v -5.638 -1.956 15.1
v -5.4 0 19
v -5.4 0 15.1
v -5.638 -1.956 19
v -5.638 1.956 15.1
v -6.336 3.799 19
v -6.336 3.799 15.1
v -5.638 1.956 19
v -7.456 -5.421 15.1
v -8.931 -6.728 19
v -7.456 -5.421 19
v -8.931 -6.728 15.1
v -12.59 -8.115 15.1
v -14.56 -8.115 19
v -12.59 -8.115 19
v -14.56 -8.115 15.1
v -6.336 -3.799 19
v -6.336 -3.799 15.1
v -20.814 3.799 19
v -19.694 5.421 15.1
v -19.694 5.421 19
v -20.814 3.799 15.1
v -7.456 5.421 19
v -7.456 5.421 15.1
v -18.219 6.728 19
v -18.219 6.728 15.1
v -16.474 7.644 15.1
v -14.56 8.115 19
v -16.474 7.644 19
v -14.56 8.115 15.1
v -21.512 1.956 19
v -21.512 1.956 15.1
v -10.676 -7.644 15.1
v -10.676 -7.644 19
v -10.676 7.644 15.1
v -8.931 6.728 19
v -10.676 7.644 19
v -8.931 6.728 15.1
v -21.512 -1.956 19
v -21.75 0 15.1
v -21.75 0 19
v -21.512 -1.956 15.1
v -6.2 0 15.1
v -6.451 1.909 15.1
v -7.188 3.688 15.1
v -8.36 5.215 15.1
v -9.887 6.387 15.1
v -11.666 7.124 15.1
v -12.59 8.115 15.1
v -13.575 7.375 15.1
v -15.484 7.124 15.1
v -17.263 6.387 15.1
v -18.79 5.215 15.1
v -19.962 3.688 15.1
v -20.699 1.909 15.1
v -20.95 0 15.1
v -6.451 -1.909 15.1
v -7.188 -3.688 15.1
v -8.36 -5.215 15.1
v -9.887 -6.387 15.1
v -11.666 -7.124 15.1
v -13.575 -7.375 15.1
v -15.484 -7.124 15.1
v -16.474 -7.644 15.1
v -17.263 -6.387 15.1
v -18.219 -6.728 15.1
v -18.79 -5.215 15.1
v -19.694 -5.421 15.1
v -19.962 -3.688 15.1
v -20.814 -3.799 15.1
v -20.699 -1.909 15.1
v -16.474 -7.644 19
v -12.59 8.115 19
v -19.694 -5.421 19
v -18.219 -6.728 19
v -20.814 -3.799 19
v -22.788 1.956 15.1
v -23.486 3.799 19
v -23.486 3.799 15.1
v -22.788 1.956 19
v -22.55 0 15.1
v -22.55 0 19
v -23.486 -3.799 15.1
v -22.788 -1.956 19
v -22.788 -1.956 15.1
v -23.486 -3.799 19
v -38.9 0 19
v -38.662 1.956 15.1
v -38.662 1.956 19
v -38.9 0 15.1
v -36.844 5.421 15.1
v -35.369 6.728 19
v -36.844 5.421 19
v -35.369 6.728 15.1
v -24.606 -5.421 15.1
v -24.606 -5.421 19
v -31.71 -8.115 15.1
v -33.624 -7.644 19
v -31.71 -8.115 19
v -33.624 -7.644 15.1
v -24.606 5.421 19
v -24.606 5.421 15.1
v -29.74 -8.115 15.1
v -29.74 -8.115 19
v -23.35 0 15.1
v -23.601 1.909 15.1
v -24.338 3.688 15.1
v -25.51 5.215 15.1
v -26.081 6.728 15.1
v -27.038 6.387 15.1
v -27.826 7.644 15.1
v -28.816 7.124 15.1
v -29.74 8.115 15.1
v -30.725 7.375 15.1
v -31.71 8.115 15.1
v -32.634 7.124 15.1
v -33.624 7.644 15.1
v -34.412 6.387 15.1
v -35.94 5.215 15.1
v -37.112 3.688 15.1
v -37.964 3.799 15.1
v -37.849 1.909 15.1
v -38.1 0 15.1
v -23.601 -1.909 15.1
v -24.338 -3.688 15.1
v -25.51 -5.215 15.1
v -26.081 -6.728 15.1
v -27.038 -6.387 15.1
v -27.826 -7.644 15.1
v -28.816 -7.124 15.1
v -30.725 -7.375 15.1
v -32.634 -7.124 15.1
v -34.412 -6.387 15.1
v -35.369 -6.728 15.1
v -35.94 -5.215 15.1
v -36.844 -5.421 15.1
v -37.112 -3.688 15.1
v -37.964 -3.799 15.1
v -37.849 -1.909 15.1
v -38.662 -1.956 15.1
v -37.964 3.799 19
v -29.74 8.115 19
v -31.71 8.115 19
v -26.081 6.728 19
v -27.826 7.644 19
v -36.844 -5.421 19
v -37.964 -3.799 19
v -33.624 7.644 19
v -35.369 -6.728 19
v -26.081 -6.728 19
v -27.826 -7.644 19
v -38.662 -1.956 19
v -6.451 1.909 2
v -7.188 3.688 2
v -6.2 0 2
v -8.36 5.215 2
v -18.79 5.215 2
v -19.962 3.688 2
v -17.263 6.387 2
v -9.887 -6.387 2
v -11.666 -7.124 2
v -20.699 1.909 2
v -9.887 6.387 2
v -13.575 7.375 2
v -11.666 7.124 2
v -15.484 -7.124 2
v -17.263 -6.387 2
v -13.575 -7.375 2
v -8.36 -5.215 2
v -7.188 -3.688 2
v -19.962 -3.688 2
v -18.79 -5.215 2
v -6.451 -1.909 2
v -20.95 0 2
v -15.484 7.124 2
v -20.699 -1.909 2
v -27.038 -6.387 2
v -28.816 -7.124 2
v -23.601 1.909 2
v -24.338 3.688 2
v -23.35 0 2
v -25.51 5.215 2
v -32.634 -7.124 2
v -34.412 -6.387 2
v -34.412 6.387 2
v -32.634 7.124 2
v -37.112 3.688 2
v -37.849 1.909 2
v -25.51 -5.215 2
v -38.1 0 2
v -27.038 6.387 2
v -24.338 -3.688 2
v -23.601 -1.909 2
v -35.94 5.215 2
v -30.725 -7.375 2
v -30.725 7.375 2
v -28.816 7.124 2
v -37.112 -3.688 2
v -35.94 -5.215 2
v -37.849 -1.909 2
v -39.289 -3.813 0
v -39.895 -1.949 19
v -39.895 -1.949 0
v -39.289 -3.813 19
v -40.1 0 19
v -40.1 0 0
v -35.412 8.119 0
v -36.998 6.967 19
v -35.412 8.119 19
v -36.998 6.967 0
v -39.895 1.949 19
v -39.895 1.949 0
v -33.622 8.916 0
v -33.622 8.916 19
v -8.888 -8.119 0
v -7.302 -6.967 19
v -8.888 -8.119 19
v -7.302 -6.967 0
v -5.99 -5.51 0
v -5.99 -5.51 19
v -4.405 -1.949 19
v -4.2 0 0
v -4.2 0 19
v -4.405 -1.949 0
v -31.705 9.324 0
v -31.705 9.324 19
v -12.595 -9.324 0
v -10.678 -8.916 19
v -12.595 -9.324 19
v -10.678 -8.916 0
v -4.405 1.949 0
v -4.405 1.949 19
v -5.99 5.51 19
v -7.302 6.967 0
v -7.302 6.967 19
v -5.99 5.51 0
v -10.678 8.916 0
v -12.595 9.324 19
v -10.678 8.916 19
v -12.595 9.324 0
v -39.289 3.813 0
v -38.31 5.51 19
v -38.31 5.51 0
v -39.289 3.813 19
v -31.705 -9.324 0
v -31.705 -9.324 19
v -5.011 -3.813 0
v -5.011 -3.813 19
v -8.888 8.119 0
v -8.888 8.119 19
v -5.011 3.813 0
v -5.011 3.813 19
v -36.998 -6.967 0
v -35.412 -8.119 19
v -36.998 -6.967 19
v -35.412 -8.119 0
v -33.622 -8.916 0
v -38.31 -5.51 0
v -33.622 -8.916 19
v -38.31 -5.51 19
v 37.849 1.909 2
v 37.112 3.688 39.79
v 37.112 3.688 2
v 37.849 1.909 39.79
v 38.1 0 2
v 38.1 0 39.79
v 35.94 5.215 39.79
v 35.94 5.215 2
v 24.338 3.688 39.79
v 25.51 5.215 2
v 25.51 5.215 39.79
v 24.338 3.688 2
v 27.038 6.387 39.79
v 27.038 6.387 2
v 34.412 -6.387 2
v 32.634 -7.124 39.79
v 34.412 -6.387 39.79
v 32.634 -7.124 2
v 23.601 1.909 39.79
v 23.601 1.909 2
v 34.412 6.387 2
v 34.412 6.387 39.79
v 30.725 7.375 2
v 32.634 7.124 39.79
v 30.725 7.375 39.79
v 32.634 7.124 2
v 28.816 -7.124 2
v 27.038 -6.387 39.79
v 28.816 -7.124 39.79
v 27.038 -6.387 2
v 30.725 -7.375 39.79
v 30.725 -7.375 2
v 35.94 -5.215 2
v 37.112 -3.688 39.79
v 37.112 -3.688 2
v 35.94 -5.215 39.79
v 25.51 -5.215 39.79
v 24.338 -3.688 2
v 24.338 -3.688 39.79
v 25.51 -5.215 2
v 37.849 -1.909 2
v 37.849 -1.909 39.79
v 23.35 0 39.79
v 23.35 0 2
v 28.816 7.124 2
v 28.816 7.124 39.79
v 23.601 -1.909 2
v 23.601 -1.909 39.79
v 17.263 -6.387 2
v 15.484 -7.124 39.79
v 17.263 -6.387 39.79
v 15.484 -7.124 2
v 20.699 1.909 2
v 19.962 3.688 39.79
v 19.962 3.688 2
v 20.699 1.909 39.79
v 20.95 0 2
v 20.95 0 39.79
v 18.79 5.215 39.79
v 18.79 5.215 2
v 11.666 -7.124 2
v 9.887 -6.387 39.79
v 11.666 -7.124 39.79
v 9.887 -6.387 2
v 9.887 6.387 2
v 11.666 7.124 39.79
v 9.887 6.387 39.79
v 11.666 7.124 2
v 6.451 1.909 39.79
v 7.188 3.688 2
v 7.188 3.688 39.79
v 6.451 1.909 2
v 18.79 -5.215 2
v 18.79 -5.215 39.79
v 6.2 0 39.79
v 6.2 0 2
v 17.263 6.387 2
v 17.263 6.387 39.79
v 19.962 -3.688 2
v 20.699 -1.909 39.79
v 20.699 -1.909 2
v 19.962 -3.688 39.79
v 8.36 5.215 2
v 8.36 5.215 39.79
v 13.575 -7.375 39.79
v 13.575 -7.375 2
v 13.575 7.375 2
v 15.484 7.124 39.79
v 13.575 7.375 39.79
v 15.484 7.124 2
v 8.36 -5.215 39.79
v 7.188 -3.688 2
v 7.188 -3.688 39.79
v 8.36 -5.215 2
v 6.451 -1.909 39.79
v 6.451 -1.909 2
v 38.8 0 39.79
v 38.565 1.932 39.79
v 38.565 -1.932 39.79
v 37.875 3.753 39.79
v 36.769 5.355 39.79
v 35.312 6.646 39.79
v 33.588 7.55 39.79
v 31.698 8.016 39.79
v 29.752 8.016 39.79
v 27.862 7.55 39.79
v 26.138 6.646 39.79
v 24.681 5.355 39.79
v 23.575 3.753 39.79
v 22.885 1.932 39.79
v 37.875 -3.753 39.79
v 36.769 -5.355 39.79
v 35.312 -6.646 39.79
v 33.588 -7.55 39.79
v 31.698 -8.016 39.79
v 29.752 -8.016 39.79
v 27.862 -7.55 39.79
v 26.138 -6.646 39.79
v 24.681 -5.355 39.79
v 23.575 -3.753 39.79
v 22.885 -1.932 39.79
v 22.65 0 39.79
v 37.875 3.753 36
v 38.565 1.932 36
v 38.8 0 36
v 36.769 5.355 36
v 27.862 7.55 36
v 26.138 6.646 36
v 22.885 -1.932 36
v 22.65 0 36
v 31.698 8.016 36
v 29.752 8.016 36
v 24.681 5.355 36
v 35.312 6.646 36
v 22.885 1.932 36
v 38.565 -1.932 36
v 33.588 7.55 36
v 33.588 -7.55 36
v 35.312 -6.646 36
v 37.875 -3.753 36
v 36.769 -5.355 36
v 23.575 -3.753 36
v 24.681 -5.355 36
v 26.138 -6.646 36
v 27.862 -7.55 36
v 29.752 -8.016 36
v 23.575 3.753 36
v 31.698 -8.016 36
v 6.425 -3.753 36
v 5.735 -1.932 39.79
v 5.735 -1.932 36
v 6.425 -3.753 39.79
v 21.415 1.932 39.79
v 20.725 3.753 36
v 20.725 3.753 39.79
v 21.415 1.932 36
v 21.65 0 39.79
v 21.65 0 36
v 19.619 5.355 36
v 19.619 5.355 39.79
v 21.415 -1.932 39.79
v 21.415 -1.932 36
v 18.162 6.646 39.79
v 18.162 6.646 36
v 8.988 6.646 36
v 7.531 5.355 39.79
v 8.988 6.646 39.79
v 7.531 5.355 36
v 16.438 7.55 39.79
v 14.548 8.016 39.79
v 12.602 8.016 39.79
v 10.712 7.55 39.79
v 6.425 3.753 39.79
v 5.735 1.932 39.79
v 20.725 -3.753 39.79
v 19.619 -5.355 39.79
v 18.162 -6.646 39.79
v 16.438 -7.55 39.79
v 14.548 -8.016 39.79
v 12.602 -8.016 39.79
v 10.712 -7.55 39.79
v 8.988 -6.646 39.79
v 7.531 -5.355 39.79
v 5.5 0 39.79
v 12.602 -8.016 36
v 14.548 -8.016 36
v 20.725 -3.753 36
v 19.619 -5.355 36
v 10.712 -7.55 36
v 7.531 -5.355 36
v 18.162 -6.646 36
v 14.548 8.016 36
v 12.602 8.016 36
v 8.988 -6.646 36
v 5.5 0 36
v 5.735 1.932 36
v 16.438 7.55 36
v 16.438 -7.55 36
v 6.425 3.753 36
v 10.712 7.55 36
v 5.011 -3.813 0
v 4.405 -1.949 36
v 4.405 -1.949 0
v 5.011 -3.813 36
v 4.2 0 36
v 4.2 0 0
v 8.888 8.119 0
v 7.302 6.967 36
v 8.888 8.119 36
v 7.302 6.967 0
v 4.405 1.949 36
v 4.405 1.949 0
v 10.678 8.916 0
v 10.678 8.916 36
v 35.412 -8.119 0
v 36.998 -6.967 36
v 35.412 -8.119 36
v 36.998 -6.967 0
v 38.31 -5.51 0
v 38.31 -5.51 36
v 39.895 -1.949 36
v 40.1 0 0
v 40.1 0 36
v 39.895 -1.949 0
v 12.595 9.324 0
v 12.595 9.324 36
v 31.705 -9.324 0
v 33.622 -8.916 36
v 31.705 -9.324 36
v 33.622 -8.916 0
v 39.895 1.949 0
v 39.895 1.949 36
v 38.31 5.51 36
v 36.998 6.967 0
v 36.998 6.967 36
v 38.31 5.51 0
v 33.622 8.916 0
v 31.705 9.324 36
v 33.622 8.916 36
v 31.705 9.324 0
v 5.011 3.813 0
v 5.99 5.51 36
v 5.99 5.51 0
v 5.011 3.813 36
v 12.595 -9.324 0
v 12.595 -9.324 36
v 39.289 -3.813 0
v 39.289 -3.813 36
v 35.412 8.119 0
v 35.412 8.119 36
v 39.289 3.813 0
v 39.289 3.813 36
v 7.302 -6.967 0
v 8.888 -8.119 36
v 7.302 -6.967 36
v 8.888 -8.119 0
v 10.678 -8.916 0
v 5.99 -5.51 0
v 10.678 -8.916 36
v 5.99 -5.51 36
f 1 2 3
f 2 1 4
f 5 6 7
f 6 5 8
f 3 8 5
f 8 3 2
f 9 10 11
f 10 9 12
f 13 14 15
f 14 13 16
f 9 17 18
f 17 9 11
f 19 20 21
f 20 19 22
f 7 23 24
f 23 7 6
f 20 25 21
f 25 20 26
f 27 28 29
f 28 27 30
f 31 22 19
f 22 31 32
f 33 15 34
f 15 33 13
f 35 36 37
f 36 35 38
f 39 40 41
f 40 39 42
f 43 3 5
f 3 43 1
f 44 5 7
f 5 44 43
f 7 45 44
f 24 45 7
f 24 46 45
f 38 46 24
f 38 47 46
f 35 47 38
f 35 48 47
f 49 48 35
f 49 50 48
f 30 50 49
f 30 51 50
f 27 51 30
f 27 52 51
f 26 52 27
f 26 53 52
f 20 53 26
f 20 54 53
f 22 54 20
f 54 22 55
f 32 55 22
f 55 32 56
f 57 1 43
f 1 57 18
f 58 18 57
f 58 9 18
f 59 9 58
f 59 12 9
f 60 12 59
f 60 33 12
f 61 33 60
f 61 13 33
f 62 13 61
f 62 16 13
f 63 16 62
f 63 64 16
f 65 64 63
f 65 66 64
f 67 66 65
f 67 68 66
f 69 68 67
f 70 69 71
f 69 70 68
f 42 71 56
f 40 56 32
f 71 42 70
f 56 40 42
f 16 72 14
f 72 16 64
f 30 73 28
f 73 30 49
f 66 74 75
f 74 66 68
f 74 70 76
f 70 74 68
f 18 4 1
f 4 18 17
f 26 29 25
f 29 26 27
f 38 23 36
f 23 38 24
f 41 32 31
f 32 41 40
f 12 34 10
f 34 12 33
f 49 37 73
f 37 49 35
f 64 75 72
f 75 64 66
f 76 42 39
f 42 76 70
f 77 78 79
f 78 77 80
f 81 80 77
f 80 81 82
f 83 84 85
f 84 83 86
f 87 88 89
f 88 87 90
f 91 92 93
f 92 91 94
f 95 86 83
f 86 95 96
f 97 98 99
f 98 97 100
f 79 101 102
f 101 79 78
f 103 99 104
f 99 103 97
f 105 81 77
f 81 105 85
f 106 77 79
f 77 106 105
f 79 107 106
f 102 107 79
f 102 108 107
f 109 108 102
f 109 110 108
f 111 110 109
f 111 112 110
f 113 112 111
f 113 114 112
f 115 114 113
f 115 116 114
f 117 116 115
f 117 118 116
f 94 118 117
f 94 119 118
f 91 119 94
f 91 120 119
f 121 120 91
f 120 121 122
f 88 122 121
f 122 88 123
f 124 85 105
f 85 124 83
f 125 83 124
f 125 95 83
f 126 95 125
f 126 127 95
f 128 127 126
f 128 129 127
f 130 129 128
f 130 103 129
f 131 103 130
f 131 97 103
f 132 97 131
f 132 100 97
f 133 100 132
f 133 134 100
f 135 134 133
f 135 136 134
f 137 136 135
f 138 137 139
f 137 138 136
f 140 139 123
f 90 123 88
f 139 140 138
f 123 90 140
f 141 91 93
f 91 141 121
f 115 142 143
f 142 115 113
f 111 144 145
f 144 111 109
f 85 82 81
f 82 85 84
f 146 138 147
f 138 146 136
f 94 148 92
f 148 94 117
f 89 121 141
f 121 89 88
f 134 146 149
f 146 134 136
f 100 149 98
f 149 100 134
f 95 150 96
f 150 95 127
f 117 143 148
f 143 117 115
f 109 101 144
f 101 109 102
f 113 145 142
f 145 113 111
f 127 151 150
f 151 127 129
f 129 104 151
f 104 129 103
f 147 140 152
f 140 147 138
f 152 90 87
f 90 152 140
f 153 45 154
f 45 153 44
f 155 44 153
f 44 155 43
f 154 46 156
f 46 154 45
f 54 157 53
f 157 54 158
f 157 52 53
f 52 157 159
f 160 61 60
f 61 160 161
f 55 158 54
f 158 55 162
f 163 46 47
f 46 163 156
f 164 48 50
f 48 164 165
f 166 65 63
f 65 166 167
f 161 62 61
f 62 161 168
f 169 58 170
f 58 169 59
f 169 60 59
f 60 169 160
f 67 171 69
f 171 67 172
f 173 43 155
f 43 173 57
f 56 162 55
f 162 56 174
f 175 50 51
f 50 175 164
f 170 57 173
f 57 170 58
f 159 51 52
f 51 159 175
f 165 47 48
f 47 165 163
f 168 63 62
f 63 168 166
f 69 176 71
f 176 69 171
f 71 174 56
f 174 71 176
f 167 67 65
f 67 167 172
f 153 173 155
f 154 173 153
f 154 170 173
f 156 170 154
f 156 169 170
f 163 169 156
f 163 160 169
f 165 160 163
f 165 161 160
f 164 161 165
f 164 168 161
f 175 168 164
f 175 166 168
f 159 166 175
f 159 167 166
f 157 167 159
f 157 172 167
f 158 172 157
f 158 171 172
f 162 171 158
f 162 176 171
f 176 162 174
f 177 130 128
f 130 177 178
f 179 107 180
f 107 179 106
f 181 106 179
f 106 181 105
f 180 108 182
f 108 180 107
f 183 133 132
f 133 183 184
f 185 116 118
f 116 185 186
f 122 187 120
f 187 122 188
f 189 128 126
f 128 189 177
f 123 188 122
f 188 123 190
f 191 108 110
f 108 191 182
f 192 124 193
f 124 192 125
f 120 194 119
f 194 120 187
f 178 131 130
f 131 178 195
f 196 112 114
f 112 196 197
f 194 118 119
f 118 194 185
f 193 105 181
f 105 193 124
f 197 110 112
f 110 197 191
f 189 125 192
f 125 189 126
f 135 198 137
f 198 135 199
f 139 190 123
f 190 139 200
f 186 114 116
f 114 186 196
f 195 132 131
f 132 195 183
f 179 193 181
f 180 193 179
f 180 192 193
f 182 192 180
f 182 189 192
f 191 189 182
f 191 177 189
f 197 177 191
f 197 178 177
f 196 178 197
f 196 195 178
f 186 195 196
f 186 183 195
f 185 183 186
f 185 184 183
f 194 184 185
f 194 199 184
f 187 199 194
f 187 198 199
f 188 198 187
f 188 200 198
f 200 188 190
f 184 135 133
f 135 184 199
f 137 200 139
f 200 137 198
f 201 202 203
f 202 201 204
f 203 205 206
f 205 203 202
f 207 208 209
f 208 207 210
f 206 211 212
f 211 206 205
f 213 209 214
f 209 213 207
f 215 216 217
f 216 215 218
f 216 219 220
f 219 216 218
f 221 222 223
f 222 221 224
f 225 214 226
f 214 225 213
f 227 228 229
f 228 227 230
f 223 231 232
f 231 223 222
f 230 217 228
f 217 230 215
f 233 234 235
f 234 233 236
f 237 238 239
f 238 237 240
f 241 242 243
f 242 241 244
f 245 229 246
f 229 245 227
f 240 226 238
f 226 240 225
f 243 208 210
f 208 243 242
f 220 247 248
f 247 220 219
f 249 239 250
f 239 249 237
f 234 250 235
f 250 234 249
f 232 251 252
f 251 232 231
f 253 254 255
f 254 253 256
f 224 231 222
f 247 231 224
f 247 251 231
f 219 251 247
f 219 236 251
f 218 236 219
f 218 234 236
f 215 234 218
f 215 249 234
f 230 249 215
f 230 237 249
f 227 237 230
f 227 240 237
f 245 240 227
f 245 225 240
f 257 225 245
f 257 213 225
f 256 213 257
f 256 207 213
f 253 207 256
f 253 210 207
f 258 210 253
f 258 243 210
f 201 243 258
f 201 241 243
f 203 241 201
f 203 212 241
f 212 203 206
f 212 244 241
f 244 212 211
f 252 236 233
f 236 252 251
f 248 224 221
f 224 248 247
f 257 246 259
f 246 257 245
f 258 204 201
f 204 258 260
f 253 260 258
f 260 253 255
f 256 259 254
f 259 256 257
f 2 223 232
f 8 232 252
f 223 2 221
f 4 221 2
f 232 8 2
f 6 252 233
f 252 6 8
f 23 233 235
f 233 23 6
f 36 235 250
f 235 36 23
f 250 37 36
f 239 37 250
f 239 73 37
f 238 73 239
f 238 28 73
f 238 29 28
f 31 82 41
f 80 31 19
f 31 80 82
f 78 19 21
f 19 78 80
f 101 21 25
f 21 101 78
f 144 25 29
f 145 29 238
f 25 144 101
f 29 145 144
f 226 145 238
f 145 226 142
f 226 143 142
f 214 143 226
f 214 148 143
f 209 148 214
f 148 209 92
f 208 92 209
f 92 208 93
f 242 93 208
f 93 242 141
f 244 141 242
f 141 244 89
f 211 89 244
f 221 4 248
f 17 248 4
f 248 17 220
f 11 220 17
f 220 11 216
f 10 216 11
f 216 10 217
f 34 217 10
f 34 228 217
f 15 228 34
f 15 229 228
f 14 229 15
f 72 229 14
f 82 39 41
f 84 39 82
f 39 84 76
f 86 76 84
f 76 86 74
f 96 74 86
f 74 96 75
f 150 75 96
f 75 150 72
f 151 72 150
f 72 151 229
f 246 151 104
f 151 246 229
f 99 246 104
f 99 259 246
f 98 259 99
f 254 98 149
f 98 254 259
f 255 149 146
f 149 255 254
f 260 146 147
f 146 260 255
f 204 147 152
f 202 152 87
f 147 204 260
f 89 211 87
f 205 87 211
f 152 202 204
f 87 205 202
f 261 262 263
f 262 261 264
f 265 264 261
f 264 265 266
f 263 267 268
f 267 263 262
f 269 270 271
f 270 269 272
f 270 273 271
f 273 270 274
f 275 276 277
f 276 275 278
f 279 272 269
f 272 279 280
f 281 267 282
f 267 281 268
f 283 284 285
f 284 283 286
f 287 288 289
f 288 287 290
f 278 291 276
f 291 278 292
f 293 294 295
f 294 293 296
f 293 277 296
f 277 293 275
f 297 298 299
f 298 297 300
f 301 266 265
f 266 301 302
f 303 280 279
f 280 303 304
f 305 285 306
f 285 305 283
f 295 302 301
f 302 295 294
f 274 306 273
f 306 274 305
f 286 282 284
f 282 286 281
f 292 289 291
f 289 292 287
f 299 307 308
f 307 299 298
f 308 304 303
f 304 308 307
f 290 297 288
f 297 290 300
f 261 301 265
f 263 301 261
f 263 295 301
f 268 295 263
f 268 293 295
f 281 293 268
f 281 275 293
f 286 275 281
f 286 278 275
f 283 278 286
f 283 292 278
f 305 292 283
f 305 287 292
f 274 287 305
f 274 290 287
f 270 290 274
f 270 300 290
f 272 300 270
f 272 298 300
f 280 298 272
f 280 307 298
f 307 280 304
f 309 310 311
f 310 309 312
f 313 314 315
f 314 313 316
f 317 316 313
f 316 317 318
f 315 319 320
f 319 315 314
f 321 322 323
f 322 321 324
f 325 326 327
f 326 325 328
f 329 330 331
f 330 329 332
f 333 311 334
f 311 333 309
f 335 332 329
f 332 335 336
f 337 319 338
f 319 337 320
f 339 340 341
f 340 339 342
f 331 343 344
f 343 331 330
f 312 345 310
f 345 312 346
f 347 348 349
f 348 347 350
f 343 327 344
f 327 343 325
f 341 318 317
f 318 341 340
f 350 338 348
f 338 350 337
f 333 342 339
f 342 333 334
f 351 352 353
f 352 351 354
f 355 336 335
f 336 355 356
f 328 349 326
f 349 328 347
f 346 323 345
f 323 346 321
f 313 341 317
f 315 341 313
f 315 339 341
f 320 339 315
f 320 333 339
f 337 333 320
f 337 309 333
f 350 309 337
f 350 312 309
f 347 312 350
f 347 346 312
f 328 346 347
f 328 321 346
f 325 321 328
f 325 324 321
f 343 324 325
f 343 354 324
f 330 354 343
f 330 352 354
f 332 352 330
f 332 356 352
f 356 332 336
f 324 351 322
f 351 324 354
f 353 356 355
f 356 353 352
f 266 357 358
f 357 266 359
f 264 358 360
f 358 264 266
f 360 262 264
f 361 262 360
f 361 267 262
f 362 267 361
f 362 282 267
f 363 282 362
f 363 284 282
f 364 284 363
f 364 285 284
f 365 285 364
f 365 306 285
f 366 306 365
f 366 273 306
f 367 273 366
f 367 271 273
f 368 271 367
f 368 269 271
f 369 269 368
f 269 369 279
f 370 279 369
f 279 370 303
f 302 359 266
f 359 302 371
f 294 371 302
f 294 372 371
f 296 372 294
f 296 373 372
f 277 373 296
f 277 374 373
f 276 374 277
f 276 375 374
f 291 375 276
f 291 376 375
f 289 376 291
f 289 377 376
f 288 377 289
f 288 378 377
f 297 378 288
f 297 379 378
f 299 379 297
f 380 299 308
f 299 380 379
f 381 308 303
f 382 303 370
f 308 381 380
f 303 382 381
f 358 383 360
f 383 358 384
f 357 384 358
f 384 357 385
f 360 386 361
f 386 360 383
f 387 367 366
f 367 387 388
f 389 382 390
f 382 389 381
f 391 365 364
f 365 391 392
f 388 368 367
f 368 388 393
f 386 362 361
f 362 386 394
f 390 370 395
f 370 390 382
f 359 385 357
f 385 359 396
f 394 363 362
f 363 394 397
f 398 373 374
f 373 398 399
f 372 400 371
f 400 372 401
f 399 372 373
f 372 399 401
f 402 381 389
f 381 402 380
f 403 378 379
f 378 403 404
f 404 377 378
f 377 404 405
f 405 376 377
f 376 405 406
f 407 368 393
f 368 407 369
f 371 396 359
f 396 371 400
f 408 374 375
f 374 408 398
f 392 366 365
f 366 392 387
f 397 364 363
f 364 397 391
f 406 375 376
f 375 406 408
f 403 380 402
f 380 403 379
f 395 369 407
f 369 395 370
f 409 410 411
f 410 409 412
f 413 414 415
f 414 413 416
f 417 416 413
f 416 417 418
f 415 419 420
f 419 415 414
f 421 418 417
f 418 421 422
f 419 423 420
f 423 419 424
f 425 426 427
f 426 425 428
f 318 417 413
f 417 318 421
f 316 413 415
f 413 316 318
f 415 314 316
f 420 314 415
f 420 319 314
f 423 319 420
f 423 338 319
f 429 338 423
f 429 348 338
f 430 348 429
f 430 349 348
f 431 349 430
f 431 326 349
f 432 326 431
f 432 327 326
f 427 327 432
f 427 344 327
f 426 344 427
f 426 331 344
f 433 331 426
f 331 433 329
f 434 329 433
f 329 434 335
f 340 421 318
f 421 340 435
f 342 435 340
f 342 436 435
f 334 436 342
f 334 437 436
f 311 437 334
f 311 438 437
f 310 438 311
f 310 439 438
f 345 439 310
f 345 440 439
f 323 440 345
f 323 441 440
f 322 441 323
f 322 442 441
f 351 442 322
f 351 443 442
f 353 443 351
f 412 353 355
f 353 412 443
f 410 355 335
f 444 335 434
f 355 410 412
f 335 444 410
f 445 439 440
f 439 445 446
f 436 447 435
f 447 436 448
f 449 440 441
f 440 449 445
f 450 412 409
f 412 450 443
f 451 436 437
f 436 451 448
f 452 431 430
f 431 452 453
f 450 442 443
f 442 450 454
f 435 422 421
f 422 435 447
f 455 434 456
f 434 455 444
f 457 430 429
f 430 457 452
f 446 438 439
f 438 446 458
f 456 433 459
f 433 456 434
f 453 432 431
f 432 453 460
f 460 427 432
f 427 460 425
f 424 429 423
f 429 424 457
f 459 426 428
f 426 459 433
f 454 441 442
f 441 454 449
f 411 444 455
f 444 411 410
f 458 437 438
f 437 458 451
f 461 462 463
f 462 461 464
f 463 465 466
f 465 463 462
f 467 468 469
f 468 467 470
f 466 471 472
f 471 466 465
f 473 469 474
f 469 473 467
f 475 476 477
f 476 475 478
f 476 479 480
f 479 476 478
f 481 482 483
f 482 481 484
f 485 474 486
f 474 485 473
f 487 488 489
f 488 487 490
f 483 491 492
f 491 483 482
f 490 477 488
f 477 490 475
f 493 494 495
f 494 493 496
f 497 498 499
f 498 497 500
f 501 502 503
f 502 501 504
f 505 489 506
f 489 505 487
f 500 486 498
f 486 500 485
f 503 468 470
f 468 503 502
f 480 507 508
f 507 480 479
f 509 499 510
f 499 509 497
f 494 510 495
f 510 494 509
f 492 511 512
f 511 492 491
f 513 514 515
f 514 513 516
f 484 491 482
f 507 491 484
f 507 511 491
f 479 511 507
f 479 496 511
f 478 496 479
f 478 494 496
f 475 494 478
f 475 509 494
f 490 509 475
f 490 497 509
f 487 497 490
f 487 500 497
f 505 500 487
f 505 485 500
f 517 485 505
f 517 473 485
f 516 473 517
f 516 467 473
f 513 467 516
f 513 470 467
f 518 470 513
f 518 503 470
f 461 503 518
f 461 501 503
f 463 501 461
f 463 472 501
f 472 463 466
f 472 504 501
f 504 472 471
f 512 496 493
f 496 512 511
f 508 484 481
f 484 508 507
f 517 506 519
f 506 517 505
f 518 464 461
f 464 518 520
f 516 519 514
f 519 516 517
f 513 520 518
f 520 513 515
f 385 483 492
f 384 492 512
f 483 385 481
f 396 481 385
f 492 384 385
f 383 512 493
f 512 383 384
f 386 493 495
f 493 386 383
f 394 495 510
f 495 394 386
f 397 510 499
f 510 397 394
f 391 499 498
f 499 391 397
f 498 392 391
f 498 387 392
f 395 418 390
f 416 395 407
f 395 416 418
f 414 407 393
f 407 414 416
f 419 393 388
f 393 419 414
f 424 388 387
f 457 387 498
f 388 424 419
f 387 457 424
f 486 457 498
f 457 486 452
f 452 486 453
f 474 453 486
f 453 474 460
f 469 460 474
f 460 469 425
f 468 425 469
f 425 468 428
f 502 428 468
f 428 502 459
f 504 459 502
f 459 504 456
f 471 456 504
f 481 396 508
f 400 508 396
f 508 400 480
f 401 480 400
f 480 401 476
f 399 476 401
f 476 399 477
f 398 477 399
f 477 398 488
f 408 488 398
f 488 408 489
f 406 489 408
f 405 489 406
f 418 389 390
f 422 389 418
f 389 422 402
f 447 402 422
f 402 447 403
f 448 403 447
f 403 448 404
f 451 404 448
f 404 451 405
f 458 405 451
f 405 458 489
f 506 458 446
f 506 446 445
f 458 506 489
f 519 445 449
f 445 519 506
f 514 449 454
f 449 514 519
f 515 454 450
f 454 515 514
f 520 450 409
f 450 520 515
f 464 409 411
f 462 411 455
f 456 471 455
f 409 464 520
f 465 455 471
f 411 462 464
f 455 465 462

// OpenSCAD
top_bottom = [-1, 1];
pad = 0.01; // Padding to maintain mainfold
wall_thickness = 2;
bottom_thickness = 1;
battery_r = 14.75 / 2;

// Actual sizes
//
battery_h = 51;
heights = [ (battery_h * (1/3)) + wall_thickness,
            (battery_h * (2/3)) + wall_thickness ];

// bottom_h = (battery_h * (2/3)) + wall_thickness;
// top_h = (battery_h * (1/3)) + wall_thickness;

// Test sizes
// battery_h = 8;
//
// bottom_h = (battery_h * (1/2)) + wall_thickness;
// top_h = (battery_h * (1/2)) + wall_thickness;

inter_battery_offset = wall_thickness - 0.8;
lip_height = 4;
lip_thickness = 0.8;
circle_offset = battery_r + inter_battery_offset;

two_by_two = [[ circle_offset, circle_offset],
              [-circle_offset, circle_offset],
              [-circle_offset,-circle_offset],
              [ circle_offset,-circle_offset]];

two_by_one =  [[ circle_offset, 0],
               [-circle_offset, 0]];

four_by_one = [[ 0, 3*circle_offset],
               [ 0,   circle_offset],
               [ 0,  -circle_offset],
               [ 0,-(3*circle_offset)]];

three_by_one = [[ 0, 3*circle_offset],
                [ 0,   circle_offset],
                [ 0,  -circle_offset]];
           


module battery_box(height, circle_centers, lip) {
  difference() {
    union() {
      linear_extrude(height = height, center = false, convexity = 10, twist = 0) {
        hull() {
          union() {
            for( i = circle_centers ) {
              translate(i) {
                circle(battery_r + wall_thickness);
              }
            }
          }
        }
      }

      // If the lip is positive then it is unioned with our outer hull
      //
      if ( lip > 0 ) {
        for( i = circle_centers ) {
          translate(i) {
            translate(v = [0, 0, height-pad]) {
              cylinder(h = lip - 0.2, r = battery_r + (lip_thickness-0.1));
            }
          }
        }
      }
    }

    // If the lip is negative then it is differenced out of our hull (so
    // positive is the male edge, and negative female is the edge of a
    // top/bottom pair, male on the bottom.)
    //
    if (lip < 0) {
      for( i = circle_centers ) {
        translate(i) {
          translate(v = [0, 0, height + lip + 0.1]) {
            cylinder(h = abs(lip), r = battery_r + (lip_thickness));
          }
        }
      }
    }

    // Four cylinders for batteries
    //
    union() {
      translate(v=[0,0,wall_thickness]) {
        for( i = circle_centers ) {
          translate(i) {
            cylinder(h = battery_h, r = battery_r );
          }
        }
      }
    }
  }
}

// In the following for-loop substitute "two_by_one" "two_by_two" etc, as
// defined at the top of the file, for the second argument to pick which
// formation of battery holder you want.
//
for (i = [0:1] ) {
  translate(v = [top_bottom[i] * (2*circle_offset + 5), 0, 0]) {
    battery_box(heights[i], two_by_one, top_bottom[i] * lip_height);
  }
}
